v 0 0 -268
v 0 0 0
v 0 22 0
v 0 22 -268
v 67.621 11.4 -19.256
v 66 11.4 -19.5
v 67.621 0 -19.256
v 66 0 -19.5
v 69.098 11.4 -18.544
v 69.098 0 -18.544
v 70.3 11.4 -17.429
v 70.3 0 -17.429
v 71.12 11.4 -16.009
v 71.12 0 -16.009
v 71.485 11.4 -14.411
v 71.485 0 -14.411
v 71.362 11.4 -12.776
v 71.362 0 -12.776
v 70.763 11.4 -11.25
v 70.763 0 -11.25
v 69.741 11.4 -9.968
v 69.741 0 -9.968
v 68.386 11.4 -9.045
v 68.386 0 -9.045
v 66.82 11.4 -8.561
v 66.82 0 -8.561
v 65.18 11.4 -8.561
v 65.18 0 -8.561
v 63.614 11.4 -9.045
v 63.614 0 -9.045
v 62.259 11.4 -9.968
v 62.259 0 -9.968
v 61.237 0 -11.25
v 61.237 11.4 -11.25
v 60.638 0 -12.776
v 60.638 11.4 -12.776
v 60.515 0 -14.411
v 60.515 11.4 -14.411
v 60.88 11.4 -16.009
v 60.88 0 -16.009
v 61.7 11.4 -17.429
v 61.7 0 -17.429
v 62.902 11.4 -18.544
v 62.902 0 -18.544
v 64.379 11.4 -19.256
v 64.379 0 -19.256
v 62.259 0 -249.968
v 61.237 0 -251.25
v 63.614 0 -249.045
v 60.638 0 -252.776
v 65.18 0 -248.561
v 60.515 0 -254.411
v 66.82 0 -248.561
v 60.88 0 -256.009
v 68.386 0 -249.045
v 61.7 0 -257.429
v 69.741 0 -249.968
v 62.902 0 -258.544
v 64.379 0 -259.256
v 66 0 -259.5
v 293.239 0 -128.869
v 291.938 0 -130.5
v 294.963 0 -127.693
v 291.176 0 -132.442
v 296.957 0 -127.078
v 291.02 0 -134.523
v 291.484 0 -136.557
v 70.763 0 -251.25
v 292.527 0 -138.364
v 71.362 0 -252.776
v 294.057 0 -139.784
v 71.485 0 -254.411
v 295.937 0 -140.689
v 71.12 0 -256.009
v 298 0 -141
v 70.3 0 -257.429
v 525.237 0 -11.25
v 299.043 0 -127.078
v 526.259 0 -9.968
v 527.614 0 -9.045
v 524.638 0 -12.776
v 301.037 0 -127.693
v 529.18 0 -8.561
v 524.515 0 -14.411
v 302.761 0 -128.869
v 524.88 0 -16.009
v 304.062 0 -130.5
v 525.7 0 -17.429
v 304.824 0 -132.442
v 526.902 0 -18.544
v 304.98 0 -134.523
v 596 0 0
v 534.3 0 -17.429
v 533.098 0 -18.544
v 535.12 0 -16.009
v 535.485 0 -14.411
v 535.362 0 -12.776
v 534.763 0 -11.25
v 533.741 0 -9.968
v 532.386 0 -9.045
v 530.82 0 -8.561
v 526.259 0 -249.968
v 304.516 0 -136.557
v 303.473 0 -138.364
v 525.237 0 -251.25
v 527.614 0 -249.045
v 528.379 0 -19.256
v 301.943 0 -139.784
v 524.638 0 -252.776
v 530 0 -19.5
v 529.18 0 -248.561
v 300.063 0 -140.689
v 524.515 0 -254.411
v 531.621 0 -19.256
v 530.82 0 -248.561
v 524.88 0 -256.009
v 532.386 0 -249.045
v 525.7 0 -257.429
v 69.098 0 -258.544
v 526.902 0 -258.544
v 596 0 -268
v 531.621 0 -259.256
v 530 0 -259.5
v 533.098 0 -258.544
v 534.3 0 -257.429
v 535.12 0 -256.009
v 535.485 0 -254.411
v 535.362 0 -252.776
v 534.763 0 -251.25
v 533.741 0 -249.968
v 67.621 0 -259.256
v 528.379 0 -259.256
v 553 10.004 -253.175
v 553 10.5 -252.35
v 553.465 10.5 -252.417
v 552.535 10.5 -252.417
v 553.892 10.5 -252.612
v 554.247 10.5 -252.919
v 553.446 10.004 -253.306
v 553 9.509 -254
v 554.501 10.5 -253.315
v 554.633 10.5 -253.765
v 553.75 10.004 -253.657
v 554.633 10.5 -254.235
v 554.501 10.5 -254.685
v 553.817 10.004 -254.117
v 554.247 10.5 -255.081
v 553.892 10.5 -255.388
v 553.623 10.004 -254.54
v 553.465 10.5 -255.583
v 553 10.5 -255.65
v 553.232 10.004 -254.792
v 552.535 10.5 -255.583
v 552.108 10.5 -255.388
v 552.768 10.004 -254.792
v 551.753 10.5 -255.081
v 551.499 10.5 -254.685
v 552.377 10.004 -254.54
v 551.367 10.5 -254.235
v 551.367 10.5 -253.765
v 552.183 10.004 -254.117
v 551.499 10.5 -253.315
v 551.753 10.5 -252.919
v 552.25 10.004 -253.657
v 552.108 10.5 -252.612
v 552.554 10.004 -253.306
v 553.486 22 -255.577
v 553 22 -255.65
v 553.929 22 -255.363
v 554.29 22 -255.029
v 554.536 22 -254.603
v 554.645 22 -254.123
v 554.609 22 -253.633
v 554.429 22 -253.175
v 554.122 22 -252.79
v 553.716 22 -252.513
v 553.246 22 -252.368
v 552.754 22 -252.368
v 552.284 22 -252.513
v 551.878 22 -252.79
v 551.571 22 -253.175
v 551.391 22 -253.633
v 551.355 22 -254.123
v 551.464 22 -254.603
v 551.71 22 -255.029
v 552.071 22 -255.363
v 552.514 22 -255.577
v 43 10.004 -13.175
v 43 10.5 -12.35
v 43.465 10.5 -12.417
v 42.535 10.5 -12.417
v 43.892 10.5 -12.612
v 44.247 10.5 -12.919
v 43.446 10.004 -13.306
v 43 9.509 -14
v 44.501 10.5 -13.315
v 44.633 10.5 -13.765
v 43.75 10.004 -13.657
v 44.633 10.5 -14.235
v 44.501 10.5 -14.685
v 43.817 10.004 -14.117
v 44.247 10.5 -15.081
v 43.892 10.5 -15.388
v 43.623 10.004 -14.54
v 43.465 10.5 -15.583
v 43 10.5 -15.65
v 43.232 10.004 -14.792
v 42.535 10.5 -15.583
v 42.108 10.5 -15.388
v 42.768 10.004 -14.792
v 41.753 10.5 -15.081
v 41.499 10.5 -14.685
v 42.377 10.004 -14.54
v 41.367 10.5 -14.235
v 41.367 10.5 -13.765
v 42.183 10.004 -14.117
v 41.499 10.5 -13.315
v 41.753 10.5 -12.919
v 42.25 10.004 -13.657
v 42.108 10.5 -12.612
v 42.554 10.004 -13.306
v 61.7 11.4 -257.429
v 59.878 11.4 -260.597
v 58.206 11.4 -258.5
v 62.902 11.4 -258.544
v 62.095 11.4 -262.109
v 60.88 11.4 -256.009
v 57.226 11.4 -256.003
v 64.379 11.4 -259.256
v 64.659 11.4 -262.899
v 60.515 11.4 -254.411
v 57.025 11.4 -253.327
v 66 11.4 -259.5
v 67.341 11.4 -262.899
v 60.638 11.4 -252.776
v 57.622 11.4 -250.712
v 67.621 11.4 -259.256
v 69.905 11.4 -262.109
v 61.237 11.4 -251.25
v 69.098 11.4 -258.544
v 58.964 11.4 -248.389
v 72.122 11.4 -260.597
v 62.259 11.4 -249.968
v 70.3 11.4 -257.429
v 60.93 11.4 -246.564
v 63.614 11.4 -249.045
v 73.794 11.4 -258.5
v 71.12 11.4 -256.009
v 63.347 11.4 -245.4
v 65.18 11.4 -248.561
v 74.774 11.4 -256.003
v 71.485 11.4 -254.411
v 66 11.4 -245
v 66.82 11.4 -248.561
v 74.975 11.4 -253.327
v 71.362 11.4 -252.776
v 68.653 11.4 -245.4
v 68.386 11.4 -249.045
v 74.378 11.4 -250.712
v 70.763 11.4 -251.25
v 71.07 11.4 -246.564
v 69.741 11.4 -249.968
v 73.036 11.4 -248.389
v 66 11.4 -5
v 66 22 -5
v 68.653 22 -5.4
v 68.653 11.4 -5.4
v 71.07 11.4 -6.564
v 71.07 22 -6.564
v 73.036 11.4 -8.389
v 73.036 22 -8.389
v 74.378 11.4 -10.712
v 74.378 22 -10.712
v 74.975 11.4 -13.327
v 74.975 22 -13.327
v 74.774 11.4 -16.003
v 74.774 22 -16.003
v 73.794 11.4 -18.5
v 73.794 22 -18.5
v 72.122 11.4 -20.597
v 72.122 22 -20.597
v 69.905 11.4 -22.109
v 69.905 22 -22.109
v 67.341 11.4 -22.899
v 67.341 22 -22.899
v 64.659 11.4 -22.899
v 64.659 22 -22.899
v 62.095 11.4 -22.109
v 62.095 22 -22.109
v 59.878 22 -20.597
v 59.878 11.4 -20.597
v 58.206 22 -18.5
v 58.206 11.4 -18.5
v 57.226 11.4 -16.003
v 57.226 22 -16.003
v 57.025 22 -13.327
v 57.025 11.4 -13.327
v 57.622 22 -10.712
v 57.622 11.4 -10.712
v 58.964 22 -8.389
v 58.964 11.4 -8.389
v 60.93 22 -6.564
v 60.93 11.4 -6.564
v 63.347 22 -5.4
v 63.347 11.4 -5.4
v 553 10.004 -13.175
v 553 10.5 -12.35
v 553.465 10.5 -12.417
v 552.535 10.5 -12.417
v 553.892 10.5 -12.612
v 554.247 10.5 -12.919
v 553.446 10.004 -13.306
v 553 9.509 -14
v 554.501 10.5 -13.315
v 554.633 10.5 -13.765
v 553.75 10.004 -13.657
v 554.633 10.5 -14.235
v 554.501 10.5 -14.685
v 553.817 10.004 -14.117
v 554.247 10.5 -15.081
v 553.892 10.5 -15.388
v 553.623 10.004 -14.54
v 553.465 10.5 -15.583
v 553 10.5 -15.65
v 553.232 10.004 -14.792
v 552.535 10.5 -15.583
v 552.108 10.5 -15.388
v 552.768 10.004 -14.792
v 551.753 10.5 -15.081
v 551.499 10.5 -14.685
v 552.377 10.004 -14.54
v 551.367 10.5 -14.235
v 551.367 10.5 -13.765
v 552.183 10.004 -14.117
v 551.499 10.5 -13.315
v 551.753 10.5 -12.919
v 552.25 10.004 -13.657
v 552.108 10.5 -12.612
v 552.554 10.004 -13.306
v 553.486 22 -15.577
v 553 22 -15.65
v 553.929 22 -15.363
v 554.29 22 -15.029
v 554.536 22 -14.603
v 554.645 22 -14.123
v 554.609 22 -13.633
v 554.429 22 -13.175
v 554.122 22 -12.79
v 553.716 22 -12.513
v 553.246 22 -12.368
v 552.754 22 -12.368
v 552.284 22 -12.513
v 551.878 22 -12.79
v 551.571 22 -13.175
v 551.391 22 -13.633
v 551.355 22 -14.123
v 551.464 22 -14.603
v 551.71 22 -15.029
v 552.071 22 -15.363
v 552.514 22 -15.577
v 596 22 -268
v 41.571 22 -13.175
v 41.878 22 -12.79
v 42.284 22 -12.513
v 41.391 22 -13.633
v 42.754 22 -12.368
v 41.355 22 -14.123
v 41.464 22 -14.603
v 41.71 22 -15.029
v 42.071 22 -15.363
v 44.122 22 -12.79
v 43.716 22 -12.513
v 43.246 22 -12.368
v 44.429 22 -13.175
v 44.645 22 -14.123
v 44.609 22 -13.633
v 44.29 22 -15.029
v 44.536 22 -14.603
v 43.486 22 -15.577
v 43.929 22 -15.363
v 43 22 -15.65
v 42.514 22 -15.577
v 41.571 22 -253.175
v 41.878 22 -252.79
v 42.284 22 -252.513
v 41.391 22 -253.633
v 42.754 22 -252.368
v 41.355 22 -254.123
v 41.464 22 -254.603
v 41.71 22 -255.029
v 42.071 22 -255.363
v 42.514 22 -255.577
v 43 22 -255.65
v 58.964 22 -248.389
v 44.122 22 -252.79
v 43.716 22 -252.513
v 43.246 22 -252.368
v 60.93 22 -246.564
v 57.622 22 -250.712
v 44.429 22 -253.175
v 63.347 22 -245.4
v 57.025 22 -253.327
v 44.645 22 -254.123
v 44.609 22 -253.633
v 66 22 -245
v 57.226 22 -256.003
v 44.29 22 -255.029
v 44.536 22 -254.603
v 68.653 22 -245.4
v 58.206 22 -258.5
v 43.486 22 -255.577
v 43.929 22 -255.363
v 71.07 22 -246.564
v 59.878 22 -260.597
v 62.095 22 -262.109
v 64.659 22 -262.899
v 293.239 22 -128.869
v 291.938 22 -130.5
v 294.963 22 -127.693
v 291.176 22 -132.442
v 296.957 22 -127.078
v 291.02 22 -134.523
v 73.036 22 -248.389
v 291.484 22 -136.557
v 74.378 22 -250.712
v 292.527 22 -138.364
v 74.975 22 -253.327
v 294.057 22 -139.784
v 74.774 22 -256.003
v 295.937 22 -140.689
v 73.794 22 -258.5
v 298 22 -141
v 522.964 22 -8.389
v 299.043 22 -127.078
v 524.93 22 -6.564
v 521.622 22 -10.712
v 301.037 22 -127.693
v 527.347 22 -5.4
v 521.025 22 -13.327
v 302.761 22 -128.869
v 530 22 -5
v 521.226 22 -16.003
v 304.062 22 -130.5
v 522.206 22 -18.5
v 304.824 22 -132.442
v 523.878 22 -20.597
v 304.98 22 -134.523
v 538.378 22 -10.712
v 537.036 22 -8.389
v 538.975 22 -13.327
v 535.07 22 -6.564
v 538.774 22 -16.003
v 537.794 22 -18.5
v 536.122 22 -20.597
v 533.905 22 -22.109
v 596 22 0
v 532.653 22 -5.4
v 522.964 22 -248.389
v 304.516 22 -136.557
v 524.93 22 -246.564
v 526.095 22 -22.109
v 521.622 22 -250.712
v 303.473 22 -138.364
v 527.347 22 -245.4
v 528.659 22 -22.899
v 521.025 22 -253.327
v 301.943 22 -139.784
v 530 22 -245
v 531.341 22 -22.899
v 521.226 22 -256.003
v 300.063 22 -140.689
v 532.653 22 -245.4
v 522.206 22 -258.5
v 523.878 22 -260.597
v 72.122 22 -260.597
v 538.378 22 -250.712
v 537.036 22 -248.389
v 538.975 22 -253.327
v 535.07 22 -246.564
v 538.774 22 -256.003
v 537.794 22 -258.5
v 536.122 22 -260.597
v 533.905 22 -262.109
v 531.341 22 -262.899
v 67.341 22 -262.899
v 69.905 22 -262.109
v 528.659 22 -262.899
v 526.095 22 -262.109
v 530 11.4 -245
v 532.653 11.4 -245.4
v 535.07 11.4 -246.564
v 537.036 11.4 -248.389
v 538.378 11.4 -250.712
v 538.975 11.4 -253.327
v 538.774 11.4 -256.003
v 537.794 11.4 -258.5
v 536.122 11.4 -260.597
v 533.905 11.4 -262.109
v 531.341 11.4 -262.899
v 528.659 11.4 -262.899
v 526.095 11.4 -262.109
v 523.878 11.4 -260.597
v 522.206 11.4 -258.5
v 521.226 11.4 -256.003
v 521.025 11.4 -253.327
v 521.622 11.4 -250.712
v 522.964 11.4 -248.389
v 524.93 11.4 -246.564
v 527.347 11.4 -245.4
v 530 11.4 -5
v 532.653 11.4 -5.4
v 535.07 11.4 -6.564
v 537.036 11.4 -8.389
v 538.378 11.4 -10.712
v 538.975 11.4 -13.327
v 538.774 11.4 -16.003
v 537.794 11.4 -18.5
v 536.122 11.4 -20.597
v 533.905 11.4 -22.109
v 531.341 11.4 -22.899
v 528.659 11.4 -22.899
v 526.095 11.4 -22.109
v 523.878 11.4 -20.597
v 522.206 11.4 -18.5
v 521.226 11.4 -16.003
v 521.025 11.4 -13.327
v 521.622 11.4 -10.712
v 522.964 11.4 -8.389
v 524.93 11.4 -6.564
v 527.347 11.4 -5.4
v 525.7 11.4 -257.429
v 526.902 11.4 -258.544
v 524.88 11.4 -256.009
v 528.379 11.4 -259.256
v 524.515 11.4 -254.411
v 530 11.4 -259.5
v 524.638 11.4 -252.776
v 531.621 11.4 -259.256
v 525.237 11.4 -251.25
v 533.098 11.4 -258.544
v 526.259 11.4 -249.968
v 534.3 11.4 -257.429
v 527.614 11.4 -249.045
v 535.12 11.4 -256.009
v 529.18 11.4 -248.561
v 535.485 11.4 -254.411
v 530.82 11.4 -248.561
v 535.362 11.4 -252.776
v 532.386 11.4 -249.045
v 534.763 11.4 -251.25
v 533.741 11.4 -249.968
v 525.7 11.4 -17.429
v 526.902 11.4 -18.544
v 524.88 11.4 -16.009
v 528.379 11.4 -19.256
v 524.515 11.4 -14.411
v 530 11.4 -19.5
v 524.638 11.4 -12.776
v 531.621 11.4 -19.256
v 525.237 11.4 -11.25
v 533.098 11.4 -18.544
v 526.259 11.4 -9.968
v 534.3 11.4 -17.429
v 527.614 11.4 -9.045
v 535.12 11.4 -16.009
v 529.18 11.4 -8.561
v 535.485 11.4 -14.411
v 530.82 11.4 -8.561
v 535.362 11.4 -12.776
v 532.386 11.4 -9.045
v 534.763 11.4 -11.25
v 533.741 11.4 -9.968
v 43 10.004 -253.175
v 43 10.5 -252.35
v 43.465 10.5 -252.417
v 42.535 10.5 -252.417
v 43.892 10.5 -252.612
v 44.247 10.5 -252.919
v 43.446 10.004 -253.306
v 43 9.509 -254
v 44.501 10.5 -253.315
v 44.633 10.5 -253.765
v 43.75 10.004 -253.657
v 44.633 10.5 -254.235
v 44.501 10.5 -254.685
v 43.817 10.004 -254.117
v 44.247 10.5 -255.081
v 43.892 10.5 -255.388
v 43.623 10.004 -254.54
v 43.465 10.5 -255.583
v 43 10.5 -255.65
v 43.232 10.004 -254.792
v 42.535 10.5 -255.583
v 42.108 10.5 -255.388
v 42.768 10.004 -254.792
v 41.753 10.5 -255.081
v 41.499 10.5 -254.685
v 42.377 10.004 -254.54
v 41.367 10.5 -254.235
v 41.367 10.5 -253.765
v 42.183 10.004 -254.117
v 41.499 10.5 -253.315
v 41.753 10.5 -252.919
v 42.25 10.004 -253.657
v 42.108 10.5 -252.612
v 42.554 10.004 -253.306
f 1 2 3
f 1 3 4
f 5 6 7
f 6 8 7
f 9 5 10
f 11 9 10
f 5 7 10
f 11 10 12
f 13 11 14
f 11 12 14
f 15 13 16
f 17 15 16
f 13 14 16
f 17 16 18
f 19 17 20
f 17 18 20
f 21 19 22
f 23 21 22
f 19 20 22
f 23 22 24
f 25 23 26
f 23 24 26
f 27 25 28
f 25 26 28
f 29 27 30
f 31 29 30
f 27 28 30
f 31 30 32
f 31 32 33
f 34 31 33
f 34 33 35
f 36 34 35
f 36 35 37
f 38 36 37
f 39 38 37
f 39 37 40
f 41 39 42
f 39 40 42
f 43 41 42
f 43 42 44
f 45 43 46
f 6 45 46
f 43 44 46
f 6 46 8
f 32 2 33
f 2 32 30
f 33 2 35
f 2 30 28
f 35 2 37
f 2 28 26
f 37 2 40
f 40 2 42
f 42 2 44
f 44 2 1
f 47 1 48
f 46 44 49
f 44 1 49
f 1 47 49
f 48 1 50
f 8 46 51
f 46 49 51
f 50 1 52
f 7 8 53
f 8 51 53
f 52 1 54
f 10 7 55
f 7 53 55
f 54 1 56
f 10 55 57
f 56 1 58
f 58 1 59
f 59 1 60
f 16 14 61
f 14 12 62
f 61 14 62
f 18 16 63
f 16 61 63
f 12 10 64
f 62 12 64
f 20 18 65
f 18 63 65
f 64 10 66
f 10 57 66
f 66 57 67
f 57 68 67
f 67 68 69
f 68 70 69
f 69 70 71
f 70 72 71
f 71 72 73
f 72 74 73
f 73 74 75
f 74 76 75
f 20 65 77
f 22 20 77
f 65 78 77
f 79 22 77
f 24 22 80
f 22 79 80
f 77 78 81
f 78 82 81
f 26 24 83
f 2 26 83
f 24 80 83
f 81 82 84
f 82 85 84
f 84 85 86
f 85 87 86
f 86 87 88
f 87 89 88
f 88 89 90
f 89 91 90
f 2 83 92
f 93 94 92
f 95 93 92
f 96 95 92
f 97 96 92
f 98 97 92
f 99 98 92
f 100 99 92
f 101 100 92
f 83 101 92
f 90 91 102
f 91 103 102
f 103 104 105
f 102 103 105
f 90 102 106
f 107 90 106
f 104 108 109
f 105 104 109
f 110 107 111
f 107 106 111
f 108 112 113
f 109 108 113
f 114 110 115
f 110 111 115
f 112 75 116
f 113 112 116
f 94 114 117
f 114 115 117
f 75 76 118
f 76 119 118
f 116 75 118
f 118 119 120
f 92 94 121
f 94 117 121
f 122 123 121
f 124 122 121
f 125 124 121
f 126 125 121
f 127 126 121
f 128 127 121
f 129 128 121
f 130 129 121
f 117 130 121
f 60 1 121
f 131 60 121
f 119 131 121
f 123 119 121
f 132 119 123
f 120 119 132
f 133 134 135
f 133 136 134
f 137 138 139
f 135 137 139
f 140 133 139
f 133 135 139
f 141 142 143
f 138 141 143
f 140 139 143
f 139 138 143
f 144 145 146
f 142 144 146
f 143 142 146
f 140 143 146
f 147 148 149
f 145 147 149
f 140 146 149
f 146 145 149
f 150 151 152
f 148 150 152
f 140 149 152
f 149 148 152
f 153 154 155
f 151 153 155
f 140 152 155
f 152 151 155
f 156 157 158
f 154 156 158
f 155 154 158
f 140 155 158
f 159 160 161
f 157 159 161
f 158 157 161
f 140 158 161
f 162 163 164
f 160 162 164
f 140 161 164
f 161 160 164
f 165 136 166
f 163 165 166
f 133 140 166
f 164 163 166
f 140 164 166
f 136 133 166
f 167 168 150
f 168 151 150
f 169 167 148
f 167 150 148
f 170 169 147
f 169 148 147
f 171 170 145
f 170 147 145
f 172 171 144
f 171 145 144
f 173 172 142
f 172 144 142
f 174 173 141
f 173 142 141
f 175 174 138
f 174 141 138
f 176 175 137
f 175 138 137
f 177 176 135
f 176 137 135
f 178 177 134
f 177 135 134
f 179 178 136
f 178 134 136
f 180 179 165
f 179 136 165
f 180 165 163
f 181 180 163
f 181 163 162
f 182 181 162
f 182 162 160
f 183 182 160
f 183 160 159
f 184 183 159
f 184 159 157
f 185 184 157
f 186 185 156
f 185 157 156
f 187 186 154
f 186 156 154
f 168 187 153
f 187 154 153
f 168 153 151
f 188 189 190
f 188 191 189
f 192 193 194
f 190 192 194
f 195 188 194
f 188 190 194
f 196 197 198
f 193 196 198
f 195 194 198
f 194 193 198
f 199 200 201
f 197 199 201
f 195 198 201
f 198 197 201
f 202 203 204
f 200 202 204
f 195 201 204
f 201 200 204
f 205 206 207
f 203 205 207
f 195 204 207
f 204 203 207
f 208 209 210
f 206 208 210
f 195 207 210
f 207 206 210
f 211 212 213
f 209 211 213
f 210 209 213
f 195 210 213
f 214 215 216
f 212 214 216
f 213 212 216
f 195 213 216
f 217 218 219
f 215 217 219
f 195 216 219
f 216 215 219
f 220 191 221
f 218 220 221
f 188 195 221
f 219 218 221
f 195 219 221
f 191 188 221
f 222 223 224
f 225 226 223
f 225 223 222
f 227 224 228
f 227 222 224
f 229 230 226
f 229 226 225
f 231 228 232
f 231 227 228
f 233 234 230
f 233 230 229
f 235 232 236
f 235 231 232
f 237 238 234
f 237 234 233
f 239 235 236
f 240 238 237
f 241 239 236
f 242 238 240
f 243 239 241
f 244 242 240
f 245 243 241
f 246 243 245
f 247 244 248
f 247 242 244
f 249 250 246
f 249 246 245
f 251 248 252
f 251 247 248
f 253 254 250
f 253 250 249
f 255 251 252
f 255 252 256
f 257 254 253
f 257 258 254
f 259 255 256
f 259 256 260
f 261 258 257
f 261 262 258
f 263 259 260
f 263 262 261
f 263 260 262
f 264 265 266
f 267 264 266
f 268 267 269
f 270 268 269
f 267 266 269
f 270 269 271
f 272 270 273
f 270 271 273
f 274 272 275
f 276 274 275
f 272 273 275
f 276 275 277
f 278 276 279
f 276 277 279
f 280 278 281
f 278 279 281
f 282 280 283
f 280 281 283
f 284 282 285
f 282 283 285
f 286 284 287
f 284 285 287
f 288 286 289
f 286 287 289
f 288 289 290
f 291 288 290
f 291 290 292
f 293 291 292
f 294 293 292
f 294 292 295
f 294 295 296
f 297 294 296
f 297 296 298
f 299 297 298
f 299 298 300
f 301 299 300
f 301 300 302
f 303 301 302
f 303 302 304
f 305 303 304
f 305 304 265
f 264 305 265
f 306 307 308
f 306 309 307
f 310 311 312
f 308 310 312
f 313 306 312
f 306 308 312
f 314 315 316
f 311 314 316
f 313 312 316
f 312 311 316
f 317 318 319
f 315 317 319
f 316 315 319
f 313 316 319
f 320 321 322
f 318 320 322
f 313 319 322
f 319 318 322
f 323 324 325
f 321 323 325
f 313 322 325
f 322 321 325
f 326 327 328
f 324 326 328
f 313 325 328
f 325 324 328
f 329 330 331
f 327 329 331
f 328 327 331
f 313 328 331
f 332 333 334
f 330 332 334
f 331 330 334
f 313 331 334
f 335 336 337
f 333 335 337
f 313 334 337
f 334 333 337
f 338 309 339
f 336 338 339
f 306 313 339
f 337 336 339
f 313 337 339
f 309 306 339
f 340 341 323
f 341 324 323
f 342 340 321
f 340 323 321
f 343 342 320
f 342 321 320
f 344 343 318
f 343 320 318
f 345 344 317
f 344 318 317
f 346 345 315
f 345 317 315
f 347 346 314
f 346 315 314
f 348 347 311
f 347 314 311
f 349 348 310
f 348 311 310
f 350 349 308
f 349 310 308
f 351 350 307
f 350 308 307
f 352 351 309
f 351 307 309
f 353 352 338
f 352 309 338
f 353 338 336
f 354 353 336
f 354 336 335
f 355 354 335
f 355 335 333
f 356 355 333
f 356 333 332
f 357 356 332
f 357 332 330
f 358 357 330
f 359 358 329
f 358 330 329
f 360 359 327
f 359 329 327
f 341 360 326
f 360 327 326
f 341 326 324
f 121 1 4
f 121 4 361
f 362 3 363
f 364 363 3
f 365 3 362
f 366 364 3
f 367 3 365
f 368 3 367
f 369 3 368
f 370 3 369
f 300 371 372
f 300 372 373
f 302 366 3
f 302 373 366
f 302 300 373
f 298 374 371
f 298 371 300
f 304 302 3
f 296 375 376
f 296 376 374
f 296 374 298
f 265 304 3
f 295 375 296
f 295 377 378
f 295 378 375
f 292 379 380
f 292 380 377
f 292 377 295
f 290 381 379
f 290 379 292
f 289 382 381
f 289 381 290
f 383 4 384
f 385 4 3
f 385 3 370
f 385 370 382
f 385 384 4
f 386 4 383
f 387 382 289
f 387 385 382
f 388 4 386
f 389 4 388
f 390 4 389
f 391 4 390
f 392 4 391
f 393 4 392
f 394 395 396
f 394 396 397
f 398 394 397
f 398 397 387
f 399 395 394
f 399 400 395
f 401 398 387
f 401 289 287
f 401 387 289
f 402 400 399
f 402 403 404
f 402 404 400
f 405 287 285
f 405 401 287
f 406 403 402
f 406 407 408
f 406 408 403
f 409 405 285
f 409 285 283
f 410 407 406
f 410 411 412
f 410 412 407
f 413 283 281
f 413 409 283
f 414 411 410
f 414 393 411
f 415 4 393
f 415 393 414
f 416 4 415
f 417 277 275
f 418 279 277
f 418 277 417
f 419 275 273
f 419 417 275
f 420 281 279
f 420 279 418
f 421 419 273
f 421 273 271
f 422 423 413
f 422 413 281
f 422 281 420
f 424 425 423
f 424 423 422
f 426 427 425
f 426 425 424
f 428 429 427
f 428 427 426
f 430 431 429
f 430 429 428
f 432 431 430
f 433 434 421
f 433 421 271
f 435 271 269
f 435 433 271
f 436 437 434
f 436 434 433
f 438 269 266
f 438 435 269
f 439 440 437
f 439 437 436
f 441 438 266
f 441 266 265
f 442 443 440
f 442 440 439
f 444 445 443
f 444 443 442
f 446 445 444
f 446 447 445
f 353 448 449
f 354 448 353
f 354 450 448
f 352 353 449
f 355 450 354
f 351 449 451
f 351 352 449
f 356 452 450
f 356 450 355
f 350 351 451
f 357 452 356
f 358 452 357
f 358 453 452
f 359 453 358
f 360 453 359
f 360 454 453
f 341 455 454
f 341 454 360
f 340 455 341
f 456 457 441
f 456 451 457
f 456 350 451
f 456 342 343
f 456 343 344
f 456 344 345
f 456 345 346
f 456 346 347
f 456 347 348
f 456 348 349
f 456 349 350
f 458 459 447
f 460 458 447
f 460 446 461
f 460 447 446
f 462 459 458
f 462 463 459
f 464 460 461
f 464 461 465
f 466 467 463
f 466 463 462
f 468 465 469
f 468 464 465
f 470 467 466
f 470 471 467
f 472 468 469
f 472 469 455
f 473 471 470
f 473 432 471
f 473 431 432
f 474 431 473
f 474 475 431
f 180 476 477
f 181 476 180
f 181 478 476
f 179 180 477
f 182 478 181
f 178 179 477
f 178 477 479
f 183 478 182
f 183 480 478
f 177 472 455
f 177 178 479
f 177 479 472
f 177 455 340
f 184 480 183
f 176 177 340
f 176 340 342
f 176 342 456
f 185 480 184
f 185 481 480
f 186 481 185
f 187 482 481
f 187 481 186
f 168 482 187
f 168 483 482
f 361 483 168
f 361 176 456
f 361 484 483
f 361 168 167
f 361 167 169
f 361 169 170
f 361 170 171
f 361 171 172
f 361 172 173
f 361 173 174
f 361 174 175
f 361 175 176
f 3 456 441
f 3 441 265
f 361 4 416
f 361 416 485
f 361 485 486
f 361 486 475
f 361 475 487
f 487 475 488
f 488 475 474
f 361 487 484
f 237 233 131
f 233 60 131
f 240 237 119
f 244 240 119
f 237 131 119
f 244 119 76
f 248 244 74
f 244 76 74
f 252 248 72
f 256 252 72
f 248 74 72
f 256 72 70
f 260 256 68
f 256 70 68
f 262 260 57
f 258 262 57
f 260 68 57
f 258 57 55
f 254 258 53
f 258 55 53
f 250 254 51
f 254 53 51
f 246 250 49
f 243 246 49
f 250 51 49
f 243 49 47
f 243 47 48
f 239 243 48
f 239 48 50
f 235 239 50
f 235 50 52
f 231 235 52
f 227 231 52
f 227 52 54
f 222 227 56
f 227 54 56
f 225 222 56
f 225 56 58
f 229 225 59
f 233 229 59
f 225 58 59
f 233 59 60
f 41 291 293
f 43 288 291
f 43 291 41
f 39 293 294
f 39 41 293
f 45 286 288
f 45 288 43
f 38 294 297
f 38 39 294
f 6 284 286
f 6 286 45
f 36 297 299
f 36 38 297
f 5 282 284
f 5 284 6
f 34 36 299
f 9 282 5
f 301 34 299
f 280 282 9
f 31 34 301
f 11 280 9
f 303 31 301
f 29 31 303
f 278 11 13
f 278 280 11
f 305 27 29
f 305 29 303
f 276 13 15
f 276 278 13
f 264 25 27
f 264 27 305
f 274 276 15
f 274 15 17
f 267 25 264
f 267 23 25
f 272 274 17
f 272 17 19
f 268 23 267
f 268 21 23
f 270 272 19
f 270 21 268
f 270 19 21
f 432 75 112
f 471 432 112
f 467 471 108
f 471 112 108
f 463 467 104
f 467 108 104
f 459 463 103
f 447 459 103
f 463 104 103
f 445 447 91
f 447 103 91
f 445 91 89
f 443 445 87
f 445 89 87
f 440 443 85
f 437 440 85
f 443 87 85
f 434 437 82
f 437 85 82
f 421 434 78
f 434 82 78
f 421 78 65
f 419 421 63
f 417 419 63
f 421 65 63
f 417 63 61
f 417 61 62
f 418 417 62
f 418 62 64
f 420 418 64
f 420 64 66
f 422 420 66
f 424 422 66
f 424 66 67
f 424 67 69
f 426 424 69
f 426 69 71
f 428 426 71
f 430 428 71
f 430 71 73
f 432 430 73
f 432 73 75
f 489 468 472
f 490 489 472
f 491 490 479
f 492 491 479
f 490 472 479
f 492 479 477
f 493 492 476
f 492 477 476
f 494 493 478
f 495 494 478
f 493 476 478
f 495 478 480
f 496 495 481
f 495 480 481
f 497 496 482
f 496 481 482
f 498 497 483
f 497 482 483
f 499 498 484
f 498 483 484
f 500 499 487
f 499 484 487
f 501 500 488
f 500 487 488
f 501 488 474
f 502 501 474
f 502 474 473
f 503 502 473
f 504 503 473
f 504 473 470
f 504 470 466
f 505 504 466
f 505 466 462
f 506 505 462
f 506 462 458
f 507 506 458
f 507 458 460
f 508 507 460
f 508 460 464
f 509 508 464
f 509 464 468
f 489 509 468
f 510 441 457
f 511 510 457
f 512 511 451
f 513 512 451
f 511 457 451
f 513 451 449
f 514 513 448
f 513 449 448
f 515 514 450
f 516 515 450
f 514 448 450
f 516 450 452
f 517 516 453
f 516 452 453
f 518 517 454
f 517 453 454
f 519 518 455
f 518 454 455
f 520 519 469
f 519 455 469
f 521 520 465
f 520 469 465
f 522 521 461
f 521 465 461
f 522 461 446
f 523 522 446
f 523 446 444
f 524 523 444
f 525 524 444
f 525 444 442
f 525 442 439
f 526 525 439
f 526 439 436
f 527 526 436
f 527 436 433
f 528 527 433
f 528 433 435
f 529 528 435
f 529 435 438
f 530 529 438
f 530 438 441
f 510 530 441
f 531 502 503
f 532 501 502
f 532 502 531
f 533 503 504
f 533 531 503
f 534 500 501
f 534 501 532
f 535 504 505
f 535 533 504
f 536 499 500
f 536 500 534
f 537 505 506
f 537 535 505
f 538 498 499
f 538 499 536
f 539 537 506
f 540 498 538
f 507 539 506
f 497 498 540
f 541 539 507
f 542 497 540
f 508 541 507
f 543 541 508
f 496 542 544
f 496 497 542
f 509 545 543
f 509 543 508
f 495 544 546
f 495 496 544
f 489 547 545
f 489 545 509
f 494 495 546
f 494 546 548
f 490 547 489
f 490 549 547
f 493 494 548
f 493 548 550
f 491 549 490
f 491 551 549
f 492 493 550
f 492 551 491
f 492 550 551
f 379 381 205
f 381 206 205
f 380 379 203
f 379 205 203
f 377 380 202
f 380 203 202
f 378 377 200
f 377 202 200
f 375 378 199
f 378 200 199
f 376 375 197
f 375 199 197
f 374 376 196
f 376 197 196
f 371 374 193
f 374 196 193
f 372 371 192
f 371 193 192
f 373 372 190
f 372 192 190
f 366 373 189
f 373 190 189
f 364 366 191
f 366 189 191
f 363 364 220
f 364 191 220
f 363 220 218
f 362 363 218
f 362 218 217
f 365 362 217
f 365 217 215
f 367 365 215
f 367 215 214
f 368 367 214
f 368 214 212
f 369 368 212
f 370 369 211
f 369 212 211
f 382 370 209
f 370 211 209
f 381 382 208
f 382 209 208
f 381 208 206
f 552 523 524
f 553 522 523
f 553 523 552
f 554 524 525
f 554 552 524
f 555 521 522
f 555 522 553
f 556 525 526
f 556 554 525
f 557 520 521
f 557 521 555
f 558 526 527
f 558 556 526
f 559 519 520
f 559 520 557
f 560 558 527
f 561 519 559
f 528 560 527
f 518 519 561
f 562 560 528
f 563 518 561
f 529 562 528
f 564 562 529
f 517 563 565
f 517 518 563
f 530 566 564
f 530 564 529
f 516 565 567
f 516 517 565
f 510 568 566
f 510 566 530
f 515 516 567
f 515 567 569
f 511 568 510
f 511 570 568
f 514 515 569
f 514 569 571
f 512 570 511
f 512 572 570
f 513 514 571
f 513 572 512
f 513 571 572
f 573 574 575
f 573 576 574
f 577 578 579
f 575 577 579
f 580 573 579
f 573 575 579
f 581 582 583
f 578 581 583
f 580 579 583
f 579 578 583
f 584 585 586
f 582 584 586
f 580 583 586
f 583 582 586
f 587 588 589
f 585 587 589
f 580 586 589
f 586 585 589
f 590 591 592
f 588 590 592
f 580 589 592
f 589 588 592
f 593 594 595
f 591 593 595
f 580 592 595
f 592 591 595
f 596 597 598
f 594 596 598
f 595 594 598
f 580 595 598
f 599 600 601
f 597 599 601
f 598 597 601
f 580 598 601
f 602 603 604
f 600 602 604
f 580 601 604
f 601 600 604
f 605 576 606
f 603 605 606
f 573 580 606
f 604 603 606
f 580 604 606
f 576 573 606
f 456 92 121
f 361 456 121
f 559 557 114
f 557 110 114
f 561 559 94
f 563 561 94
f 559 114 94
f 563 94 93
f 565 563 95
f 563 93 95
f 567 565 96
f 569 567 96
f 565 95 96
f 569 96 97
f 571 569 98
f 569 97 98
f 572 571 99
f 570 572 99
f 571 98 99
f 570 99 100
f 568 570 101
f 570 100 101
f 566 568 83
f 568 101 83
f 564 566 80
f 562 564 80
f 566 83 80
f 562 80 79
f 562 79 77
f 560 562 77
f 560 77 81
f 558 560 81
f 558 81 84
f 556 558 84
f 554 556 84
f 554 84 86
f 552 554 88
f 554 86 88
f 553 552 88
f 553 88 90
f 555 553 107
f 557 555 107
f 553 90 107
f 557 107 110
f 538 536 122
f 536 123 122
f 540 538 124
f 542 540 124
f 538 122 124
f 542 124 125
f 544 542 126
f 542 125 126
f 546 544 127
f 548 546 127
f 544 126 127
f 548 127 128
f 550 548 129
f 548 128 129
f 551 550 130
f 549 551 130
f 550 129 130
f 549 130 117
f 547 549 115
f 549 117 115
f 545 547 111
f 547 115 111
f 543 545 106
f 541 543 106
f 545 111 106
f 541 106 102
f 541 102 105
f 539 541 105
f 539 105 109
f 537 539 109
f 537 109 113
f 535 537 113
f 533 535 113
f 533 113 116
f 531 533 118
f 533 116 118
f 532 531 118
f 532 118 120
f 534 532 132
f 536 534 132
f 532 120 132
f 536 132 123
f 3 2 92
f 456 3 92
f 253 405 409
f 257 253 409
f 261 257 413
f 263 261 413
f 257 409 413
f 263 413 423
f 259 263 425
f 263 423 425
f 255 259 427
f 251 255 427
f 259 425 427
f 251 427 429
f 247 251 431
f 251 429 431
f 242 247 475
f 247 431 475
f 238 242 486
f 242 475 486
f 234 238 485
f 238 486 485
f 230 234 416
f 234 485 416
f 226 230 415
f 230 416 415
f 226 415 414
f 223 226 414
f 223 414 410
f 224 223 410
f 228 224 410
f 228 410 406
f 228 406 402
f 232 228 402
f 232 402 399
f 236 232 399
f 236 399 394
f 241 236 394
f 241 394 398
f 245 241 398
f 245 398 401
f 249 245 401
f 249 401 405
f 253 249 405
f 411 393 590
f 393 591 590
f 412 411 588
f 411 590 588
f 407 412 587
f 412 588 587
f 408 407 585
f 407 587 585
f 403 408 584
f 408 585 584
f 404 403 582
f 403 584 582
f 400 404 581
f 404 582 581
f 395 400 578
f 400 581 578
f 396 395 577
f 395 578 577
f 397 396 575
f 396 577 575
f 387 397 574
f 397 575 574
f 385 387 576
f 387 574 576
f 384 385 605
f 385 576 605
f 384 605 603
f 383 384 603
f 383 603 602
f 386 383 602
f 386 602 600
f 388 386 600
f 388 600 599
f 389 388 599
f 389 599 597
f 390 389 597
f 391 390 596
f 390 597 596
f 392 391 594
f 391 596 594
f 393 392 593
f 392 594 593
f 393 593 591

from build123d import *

# Parameters (mm, degrees)
SZKIC1_W                                           = 596
SZKIC1_H                                           = 268
DODANIE_WYCI_GNI_CIE1_DEPTH                        = 22
POG_BIENIE_WALCOWE_POD_M10_WKR_T_Z_BEM_D           = 11
POG_BIENIE_WALCOWE_POD_M10_WKR_T_Z_BEM_CBORE_D     = 18
POG_BIENIE_WALCOWE_POD_M10_WKR_T_Z_BEM_CBORE_DEPTH = 10.6
OTW_R_GWINTOWANY_M41_D                             = 3.3
OTW_R_GWINTOWANY_M41_DEPTH                         = 11.5
OTW_R_GWINTOWANY_M41_TIP                           = 0.991420021
OTW_R_GWINTOWANY_M161_D                            = 14


with BuildPart() as part:
    # Szkic1 → Dodanie-wyciągnięcie1 (new body)
    with BuildSketch(Plane(origin=(0, 0, 0), x_dir=(1, 0, 0), z_dir=(0, 1, 0))):
        with Locations((298, 134)):
            Rectangle(SZKIC1_W, SZKIC1_H)
    extrude(amount=DODANIE_WYCI_GNI_CIE1_DEPTH)

    # Pogłębienie walcowe pod M10 Wkręt z łbem walcowym z gniazdem sześciokątnym1 (through all)
    with Locations(Plane(origin=(66, 22, -254), x_dir=(0, 0, 1), z_dir=(0, 1, 0))):
        with Locations((0, 0), (240, 0), (240, 464), (0, 464)):
            CounterBoreHole(POG_BIENIE_WALCOWE_POD_M10_WKR_T_Z_BEM_D / 2, POG_BIENIE_WALCOWE_POD_M10_WKR_T_Z_BEM_CBORE_D / 2, POG_BIENIE_WALCOWE_POD_M10_WKR_T_Z_BEM_CBORE_DEPTH)

    # Otwór gwintowany M41
    with Locations(Plane(origin=(43, 22, -14), x_dir=(0, 0, 1), z_dir=(0, 1, 0))):
        with Locations((0, 0), (-240, 0), (-240, 510), (0, 510)):
            Hole(OTW_R_GWINTOWANY_M41_D / 2, depth=OTW_R_GWINTOWANY_M41_DEPTH)
            with Locations((0, 0, -(OTW_R_GWINTOWANY_M41_DEPTH + OTW_R_GWINTOWANY_M41_TIP / 2))):  # 118° drill point
                Cone(0, OTW_R_GWINTOWANY_M41_D / 2, OTW_R_GWINTOWANY_M41_TIP, mode=Mode.SUBTRACT)

    # Otwór gwintowany M161 (through all)
    with Locations(Plane(origin=(298, 22, -134), x_dir=(0, 0, 1), z_dir=(0, 1, 0))):
        with Locations((0, 0)):
            Hole(OTW_R_GWINTOWANY_M161_D / 2)


solid = part.part
